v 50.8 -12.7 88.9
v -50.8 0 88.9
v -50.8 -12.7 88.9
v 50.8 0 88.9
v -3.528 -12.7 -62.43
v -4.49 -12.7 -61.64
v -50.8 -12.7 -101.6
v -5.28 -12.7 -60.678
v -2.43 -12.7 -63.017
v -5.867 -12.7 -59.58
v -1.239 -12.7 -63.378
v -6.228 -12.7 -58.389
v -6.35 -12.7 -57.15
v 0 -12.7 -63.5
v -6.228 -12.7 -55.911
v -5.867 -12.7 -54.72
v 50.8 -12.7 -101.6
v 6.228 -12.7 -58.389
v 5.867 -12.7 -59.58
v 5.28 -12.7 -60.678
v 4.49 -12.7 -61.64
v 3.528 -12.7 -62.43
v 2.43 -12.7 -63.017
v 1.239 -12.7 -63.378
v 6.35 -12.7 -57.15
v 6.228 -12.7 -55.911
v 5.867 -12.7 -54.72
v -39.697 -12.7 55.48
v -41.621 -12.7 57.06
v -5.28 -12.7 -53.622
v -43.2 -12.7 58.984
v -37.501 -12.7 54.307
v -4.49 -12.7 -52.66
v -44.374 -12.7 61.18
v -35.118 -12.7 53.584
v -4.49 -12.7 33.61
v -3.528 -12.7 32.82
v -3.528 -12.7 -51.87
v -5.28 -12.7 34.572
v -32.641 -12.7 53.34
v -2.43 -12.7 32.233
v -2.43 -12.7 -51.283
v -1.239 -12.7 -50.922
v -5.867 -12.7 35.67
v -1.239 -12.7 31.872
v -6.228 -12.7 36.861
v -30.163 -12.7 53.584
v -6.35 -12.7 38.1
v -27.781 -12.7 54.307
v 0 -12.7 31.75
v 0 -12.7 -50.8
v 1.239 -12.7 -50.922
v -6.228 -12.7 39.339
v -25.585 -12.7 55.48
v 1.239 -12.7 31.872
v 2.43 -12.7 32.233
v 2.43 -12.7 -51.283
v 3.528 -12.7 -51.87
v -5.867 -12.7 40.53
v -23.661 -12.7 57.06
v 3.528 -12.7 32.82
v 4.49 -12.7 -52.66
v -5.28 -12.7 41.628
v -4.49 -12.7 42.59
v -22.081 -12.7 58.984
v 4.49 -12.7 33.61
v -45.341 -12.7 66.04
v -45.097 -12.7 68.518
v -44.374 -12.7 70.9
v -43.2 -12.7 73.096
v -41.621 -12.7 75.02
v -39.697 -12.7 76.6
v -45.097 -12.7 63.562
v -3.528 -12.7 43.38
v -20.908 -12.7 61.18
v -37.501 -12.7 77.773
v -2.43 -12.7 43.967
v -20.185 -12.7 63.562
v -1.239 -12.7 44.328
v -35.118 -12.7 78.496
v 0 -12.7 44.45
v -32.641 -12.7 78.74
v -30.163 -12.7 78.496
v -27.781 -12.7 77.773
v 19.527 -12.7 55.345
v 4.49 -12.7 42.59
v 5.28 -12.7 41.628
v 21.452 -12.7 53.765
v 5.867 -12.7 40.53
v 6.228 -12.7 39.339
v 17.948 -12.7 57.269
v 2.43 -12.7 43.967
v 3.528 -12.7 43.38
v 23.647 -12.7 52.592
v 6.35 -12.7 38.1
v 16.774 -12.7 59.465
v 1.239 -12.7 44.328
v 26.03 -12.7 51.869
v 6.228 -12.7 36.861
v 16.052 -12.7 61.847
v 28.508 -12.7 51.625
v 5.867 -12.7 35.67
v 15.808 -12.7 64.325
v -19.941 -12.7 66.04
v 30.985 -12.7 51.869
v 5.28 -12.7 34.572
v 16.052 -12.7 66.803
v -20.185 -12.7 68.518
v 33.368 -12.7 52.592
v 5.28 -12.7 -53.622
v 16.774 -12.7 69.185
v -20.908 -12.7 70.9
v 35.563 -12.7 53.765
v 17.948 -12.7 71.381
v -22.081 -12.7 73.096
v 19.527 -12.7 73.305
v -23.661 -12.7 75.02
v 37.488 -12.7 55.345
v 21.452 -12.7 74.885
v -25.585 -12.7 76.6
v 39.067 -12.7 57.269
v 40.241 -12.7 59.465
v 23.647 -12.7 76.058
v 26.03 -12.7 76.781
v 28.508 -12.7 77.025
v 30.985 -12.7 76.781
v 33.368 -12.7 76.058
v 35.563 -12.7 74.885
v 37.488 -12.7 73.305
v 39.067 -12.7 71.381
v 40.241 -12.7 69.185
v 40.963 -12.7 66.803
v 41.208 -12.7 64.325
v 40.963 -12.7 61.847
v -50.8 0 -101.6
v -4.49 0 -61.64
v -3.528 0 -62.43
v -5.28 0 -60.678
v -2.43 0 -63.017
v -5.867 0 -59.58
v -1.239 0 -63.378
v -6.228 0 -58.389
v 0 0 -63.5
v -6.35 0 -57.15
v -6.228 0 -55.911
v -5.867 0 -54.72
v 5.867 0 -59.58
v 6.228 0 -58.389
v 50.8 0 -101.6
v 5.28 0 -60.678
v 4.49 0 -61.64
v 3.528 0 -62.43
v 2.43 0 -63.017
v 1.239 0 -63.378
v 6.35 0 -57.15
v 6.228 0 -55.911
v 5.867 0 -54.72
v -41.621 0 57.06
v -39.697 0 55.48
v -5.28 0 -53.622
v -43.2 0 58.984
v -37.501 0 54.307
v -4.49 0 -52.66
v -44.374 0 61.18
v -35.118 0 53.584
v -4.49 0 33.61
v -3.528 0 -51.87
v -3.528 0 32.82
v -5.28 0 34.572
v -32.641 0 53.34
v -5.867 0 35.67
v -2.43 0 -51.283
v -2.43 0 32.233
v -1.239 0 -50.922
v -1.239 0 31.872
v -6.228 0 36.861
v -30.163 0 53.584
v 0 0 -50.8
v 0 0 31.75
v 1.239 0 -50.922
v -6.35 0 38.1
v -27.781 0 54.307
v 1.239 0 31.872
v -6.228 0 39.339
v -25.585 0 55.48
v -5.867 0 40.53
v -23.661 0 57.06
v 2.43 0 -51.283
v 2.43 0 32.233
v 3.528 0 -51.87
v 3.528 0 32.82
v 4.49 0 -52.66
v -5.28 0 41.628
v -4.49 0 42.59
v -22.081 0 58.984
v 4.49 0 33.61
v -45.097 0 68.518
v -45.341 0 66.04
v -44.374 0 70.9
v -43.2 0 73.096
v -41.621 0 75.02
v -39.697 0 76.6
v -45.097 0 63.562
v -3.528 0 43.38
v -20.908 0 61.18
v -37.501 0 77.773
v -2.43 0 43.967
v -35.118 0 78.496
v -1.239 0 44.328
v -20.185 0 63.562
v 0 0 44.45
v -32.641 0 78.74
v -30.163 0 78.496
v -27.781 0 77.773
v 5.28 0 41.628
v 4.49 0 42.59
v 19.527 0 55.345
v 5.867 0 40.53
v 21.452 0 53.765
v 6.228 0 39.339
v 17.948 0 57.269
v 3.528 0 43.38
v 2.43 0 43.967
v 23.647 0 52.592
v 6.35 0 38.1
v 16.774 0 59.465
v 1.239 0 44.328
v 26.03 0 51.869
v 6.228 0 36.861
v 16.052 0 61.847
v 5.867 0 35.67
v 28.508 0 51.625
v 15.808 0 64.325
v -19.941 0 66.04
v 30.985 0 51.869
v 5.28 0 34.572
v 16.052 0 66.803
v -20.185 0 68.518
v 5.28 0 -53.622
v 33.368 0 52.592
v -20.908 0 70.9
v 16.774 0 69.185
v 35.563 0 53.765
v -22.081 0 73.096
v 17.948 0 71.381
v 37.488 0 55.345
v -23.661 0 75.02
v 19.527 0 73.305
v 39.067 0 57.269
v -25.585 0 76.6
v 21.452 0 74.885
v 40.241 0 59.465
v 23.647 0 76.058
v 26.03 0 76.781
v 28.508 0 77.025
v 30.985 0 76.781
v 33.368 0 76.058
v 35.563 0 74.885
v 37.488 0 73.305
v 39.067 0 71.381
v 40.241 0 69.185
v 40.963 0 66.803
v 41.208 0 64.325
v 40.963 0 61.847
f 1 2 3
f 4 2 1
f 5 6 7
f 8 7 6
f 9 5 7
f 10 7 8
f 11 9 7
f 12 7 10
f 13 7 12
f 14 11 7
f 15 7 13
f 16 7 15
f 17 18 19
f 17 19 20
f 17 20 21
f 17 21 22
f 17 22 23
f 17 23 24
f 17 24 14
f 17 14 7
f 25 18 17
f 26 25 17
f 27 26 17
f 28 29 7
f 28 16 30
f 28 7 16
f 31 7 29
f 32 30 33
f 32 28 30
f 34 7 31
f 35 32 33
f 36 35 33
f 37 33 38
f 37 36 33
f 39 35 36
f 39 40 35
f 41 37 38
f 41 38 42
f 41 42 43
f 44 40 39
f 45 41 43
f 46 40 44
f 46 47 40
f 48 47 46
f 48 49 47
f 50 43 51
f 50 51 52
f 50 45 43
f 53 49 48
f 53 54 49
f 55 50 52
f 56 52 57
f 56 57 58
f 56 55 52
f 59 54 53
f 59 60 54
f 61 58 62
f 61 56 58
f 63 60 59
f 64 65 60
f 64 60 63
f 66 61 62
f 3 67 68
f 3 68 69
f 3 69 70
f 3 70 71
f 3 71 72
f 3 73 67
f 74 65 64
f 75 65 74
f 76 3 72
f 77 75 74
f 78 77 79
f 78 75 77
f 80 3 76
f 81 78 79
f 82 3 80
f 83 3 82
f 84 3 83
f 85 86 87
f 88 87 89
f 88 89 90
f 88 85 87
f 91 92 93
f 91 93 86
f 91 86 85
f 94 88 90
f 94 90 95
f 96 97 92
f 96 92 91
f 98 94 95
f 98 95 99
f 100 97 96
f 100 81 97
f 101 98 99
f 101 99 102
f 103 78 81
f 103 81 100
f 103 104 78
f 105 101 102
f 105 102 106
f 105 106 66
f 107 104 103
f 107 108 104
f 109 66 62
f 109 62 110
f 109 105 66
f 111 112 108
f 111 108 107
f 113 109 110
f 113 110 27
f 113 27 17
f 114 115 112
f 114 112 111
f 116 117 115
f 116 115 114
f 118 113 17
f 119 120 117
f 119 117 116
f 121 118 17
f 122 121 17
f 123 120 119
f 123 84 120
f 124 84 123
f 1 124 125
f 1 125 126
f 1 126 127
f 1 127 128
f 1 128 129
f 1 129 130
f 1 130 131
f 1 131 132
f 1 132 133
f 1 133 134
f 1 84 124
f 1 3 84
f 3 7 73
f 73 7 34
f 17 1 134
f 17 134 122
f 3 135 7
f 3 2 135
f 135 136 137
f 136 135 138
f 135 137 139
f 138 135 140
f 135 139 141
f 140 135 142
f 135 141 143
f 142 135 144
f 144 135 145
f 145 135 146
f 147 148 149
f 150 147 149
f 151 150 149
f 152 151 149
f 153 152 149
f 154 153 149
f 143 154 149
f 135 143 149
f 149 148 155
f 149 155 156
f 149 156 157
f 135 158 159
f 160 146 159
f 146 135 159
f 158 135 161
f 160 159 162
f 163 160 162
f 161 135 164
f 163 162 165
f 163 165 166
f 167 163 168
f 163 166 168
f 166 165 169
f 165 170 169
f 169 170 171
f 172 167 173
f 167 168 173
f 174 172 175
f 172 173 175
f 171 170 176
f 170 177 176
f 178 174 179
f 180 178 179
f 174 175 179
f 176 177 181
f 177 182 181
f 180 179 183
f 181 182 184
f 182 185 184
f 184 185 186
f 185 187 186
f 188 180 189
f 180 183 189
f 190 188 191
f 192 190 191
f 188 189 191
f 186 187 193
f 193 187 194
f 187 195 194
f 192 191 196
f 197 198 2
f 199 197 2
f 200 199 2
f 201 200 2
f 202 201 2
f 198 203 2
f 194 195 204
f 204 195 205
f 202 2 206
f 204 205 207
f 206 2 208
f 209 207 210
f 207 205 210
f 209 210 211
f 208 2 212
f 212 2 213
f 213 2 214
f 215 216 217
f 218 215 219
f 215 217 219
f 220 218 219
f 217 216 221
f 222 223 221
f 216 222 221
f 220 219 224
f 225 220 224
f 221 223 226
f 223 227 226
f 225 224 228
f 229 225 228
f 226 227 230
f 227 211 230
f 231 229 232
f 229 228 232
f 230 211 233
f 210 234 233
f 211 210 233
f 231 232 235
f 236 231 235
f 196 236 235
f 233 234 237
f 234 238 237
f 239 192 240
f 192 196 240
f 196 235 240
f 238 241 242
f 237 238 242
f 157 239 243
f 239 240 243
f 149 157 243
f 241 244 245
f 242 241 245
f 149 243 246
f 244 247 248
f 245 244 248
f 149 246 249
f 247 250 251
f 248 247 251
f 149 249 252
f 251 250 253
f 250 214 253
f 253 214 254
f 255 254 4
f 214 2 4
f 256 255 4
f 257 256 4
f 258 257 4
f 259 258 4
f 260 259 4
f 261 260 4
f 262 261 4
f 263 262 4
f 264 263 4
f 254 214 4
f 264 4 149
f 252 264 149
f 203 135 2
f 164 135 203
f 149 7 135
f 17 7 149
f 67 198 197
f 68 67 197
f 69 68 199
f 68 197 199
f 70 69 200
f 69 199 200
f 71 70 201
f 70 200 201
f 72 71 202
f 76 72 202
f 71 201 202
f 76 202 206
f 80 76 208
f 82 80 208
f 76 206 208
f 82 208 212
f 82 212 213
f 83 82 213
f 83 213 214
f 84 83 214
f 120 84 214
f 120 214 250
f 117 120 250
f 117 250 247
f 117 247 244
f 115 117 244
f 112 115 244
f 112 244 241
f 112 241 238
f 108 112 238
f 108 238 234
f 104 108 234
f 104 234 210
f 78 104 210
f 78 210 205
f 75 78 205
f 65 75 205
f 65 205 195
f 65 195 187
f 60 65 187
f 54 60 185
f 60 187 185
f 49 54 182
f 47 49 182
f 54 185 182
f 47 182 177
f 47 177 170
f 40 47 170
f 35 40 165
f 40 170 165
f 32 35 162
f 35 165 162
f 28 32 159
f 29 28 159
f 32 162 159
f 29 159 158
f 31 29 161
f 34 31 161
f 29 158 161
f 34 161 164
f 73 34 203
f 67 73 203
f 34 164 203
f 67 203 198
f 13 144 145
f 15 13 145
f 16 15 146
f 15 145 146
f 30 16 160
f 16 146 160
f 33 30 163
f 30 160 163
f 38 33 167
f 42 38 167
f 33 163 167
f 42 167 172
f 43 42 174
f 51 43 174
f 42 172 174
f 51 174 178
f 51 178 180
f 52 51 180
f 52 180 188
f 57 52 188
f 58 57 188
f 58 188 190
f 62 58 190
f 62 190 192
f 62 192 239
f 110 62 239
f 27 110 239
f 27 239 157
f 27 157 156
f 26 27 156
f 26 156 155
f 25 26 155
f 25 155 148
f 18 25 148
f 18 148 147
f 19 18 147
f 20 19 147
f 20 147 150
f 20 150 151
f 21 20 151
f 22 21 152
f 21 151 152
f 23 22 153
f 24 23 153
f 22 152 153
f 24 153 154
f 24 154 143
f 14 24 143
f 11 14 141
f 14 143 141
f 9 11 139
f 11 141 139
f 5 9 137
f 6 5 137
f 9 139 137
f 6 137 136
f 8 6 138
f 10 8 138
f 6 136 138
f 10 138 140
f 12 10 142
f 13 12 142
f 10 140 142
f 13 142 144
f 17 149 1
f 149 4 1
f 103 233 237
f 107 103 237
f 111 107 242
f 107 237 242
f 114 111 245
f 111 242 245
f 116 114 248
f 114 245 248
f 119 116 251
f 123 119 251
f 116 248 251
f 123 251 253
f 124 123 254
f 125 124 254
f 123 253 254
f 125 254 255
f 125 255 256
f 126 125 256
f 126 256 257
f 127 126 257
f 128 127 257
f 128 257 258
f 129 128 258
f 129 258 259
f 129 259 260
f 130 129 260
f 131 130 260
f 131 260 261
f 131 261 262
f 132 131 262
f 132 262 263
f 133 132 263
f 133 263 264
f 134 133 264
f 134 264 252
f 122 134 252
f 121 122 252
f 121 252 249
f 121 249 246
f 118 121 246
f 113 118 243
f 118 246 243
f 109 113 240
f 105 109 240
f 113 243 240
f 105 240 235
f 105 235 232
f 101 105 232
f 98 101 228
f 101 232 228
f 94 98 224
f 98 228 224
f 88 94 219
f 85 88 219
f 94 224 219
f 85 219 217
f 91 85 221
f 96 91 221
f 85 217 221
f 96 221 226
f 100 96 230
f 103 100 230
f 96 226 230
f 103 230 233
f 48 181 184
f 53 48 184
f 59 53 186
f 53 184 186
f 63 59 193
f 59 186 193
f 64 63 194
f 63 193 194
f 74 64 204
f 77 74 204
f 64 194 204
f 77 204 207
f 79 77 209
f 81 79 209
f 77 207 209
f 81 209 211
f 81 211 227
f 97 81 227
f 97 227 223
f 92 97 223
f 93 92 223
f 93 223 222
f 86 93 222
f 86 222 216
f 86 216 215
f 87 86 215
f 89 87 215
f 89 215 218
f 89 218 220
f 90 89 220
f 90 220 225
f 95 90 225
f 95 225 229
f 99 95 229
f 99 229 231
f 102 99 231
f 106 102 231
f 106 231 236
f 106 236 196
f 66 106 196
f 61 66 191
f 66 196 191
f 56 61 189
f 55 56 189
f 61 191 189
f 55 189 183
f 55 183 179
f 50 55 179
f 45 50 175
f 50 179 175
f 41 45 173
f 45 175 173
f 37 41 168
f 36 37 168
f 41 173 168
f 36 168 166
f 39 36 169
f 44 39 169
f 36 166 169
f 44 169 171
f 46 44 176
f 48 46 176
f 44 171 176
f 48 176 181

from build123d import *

# Parameters (mm, degrees)
F0_W     = 101.6
F0_H     = 177.8
F1_DEPTH = 12.7
F2_W     = 101.6
F2_H     = 12.7
F3_DEPTH = 12.7
F4_R     = 12.7
F4_R_2   = 6.35
F5_DEPTH = 12.701
F6_R     = 6.35
F7_DEPTH = 12.701


# Not quite as in the source:
# - a feature names something its author has since deleted; it is built from what else it names


with BuildPart() as f1:
    # F0 (on Front) → F1 (new body)
    with BuildSketch(Plane.XZ):
        Rectangle(F0_W, F0_H)
    extrude(amount=F1_DEPTH)

    # F2 (on face) → F3 (join)
    with BuildSketch(Plane(origin=(0, 0, -88.9), x_dir=(1, 0, 0), z_dir=(0, 0, -1))):
        with Locations((0, 6.35)):
            Rectangle(F2_W, F2_H)
    extrude(amount=F3_DEPTH)

    # F4 (on face) → F5 (cut, through all)
    with BuildSketch(Plane(origin=(0, 0, 0), x_dir=(-1, 0, 0), z_dir=(0, 1, 0))):
        with Locations((-28.5075195134, 64.3249601126)):
            Circle(F4_R)
        with Locations((0, 38.1)):
            Circle(F4_R_2)
        with Locations((32.6408334076, 66.04)):
            Circle(F4_R)
    extrude(amount=-F5_DEPTH, mode=Mode.SUBTRACT)

    # F6 (on face) → F7 (cut, through all)
    with BuildSketch(Plane(origin=(0, 0, 0), x_dir=(-1, 0, 0), z_dir=(0, 1, 0))):
        with Locations((0, -57.15)):
            Circle(F6_R)
    extrude(amount=-F7_DEPTH, mode=Mode.SUBTRACT)


solid = f1.part
